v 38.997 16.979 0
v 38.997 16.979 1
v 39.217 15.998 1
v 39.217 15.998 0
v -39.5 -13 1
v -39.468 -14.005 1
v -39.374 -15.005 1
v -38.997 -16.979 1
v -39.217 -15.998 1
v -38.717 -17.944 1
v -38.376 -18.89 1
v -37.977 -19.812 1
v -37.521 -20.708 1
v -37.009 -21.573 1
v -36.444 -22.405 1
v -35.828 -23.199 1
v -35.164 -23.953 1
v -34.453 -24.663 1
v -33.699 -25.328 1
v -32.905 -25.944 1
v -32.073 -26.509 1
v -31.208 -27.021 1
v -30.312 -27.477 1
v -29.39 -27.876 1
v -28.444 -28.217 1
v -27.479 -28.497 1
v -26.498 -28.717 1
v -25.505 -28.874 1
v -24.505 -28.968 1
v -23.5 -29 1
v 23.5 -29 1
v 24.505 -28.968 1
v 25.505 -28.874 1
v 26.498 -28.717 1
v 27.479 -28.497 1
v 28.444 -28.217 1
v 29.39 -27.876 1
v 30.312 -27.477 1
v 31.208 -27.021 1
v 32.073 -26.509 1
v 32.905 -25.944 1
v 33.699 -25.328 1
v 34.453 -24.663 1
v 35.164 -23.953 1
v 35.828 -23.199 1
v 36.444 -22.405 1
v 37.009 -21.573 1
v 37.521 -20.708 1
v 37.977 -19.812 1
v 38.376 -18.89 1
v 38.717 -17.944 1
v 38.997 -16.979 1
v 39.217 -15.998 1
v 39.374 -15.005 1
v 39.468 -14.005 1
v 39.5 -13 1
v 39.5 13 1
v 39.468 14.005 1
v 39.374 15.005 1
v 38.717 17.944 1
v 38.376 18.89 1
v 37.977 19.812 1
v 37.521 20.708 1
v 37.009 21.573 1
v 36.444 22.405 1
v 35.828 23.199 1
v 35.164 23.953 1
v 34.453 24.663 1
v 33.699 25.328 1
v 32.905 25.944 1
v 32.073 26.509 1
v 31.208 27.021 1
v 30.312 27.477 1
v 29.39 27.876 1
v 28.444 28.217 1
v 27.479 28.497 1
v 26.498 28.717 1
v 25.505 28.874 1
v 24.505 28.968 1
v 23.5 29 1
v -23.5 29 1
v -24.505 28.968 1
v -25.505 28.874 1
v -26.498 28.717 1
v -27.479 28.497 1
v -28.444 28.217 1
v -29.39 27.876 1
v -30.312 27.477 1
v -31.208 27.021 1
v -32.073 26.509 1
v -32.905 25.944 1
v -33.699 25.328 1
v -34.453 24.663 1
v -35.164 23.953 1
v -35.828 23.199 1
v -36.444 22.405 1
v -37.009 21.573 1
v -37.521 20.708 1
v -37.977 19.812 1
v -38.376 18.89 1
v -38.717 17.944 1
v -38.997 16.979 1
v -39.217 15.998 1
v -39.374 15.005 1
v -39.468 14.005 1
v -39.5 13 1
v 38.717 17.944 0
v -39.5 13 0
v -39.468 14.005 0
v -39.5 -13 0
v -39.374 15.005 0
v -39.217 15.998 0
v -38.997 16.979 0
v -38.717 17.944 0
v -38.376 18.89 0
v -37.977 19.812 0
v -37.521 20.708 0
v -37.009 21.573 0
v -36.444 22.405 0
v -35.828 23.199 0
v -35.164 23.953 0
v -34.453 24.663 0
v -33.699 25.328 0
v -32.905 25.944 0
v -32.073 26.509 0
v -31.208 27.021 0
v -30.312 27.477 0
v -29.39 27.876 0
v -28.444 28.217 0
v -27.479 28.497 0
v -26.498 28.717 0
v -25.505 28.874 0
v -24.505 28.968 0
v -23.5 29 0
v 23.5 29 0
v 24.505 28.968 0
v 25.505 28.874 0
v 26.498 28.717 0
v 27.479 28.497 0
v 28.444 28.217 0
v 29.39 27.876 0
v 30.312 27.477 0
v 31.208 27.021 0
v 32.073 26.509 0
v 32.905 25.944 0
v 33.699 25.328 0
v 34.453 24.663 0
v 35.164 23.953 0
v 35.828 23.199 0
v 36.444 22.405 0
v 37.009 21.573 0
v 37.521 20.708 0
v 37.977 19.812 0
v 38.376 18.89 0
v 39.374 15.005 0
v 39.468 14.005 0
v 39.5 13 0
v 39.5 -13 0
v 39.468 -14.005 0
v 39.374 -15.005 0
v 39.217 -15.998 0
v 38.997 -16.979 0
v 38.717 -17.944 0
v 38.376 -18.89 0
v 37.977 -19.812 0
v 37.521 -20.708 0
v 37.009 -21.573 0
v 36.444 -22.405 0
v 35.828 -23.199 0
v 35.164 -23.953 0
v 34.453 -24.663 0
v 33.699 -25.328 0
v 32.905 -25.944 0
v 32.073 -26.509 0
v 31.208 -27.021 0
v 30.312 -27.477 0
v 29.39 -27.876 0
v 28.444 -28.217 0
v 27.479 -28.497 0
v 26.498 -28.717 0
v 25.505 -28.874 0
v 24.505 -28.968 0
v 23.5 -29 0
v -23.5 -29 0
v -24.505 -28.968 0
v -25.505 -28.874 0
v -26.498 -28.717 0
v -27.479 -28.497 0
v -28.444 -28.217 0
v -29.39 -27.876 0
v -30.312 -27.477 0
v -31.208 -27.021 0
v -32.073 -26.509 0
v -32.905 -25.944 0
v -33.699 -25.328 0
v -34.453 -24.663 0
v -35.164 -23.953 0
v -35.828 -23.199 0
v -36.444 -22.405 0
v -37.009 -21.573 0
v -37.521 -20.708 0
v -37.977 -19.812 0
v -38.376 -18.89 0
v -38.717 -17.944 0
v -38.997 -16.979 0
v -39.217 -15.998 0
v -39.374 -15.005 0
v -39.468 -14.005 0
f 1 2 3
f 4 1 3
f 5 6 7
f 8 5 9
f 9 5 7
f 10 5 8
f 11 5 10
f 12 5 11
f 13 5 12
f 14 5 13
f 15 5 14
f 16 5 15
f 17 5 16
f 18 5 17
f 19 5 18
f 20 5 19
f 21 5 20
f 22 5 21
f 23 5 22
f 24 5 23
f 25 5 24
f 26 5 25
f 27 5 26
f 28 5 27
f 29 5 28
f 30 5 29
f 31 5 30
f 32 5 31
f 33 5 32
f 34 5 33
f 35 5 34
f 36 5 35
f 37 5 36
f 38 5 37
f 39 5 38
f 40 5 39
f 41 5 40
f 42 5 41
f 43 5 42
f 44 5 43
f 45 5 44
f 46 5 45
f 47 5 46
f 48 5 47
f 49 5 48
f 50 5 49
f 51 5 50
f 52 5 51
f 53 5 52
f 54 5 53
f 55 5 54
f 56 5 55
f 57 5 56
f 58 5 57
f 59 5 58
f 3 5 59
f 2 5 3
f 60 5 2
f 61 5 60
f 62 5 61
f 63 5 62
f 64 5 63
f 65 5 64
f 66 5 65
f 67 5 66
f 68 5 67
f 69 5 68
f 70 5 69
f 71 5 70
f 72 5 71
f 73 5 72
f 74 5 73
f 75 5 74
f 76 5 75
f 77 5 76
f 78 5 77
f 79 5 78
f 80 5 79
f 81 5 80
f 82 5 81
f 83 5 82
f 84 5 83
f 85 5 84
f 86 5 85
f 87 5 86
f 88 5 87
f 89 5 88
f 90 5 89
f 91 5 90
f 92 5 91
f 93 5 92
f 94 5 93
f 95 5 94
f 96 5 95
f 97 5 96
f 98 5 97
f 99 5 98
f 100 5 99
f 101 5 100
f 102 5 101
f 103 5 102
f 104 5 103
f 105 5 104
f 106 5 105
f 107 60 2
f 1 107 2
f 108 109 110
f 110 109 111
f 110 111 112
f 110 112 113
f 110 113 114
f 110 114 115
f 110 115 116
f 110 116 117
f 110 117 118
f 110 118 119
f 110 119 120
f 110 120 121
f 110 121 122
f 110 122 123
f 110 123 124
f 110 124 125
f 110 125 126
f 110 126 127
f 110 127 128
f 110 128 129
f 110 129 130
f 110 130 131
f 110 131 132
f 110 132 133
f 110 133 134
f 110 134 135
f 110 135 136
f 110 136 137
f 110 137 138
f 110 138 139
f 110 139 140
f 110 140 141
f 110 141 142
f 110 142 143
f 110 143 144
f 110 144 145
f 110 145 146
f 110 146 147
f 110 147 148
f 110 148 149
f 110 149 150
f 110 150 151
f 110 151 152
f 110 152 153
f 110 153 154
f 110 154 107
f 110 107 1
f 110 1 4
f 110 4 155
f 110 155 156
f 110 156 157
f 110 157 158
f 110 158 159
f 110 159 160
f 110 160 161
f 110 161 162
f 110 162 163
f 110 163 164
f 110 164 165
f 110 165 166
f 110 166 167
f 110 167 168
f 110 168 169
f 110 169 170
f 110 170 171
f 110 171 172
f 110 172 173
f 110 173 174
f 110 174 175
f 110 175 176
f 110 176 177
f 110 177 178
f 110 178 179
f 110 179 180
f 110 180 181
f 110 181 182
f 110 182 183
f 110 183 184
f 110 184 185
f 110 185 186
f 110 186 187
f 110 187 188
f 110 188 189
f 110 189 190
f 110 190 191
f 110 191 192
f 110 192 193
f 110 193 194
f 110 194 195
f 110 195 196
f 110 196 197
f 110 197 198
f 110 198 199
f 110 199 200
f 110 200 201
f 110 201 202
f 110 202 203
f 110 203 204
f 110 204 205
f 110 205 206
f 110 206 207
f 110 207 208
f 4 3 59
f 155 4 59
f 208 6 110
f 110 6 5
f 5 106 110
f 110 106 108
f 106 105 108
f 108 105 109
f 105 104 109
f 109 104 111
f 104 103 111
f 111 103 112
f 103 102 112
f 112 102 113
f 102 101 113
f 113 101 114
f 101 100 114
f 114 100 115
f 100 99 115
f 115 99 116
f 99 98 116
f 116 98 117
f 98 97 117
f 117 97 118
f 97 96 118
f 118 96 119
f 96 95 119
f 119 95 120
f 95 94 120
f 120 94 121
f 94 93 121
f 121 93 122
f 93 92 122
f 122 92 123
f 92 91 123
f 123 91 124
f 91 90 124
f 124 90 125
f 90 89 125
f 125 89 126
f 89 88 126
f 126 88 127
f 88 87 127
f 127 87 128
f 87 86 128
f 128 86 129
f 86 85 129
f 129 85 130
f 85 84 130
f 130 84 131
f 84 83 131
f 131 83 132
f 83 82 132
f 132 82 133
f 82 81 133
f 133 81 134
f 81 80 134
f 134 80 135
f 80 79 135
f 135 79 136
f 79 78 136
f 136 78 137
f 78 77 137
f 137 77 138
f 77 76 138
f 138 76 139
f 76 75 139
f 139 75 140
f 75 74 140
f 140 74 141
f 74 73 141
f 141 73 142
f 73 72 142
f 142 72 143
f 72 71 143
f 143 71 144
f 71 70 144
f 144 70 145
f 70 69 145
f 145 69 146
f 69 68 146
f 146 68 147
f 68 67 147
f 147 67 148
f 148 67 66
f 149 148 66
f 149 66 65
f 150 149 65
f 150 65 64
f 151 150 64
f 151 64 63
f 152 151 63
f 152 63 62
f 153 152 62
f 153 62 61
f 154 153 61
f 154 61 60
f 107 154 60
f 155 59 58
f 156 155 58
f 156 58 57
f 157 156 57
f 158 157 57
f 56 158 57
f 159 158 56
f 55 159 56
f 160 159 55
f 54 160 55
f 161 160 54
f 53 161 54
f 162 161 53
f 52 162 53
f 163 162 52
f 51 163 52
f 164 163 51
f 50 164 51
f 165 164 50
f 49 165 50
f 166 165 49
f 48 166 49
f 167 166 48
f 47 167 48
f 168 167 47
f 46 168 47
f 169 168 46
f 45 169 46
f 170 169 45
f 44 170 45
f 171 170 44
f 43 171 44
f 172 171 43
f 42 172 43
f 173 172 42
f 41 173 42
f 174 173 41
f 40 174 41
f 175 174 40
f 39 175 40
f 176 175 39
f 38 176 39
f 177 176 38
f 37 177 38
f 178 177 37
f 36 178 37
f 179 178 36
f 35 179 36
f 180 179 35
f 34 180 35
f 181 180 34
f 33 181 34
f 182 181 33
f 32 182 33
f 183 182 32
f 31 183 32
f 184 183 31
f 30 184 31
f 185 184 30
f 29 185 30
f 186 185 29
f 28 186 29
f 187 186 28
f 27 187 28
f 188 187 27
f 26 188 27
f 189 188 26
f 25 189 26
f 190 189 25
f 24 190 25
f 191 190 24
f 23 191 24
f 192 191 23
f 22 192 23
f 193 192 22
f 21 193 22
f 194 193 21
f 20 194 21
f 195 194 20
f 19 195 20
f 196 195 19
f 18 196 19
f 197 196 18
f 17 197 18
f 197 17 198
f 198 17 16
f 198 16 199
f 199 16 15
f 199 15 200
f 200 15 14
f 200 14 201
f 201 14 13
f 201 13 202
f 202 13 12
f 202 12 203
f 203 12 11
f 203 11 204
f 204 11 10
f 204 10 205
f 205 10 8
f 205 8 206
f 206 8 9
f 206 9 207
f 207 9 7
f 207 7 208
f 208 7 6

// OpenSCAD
points_0=[[38.9973,16.979,0],[38.9973,16.979,1],[39.2166,15.9981,1],[39.2166,15.9981,0],[-39.5,-13,1],[-39.4684,-14.0046,1],[-39.3738,-15.0053,1],[-38.9973,-16.979,1],[-39.2166,-15.9981,1],[-38.7169,-17.9443,1],[-38.3764,-18.89,1],[-37.9772,-19.8125,1],[-37.5209,-20.7081,1],[-37.0092,-21.5732,1],[-36.4443,-22.4046,1],[-35.8282,-23.1988,1],[-35.1635,-23.9527,1],[-34.4527,-24.6635,1],[-33.6988,-25.3282,1],[-32.9046,-25.9443,1],[-32.0732,-26.5092,1],[-31.2081,-27.0209,1],[-30.3125,-27.4772,1],[-29.39,-27.8764,1],[-28.4443,-28.2169,1],[-27.479,-28.4973,1],[-26.4981,-28.7166,1],[-25.5053,-28.8738,1],[-24.5046,-28.9684,1],[-23.5,-29,1],[23.5,-29,1],[24.5046,-28.9684,1],[25.5053,-28.8738,1],[26.4981,-28.7166,1],[27.479,-28.4973,1],[28.4443,-28.2169,1],[29.39,-27.8764,1],[30.3125,-27.4772,1],[31.2081,-27.0209,1],[32.0732,-26.5092,1],[32.9046,-25.9443,1],[33.6988,-25.3282,1],[34.4527,-24.6635,1],[35.1635,-23.9527,1],[35.8282,-23.1988,1],[36.4443,-22.4046,1],[37.0092,-21.5732,1],[37.5209,-20.7081,1],[37.9772,-19.8125,1],[38.3764,-18.89,1],[38.7169,-17.9443,1],[38.9973,-16.979,1],[39.2166,-15.9981,1],[39.3738,-15.0053,1],[39.4684,-14.0046,1],[39.5,-13,1],[39.5,13,1],[39.4684,14.0046,1],[39.3738,15.0053,1],[38.7169,17.9443,1],[38.3764,18.89,1],[37.9772,19.8125,1],[37.5209,20.7081,1],[37.0092,21.5732,1],[36.4443,22.4046,1],[35.8282,23.1988,1],[35.1635,23.9527,1],[34.4527,24.6635,1],[33.6988,25.3282,1],[32.9046,25.9443,1],[32.0732,26.5092,1],[31.2081,27.0209,1],[30.3125,27.4772,1],[29.39,27.8764,1],[28.4443,28.2169,1],[27.479,28.4973,1],[26.4981,28.7166,1],[25.5053,28.8738,1],[24.5046,28.9684,1],[23.5,29,1],[-23.5,29,1],[-24.5046,28.9684,1],[-25.5053,28.8738,1],[-26.4981,28.7166,1],[-27.479,28.4973,1],[-28.4443,28.2169,1],[-29.39,27.8764,1],[-30.3125,27.4772,1],[-31.2081,27.0209,1],[-32.0732,26.5092,1],[-32.9046,25.9443,1],[-33.6988,25.3282,1],[-34.4527,24.6635,1],[-35.1635,23.9527,1],[-35.8282,23.1988,1],[-36.4443,22.4046,1],[-37.0092,21.5732,1],[-37.5209,20.7081,1],[-37.9772,19.8125,1],[-38.3764,18.89,1],[-38.7169,17.9443,1],[-38.9973,16.979,1],[-39.2166,15.9981,1],[-39.3738,15.0053,1],[-39.4684,14.0046,1],[-39.5,13,1],[38.7169,17.9443,0],[-39.5,13,0],[-39.4684,14.0046,0],[-39.5,-13,0],[-39.3738,15.0053,0],[-39.2166,15.9981,0],[-38.9973,16.979,0],[-38.7169,17.9443,0],[-38.3764,18.89,0],[-37.9772,19.8125,0],[-37.5209,20.7081,0],[-37.0092,21.5732,0],[-36.4443,22.4046,0],[-35.8282,23.1988,0],[-35.1635,23.9527,0],[-34.4527,24.6635,0],[-33.6988,25.3282,0],[-32.9046,25.9443,0],[-32.0732,26.5092,0],[-31.2081,27.0209,0],[-30.3125,27.4772,0],[-29.39,27.8764,0],[-28.4443,28.2169,0],[-27.479,28.4973,0],[-26.4981,28.7166,0],[-25.5053,28.8738,0],[-24.5046,28.9684,0],[-23.5,29,0],[23.5,29,0],[24.5046,28.9684,0],[25.5053,28.8738,0],[26.4981,28.7166,0],[27.479,28.4973,0],[28.4443,28.2169,0],[29.39,27.8764,0],[30.3125,27.4772,0],[31.2081,27.0209,0],[32.0732,26.5092,0],[32.9046,25.9443,0],[33.6988,25.3282,0],[34.4527,24.6635,0],[35.1635,23.9527,0],[35.8282,23.1988,0],[36.4443,22.4046,0],[37.0092,21.5732,0],[37.5209,20.7081,0],[37.9772,19.8125,0],[38.3764,18.89,0],[39.3738,15.0053,0],[39.4684,14.0046,0],[39.5,13,0],[39.5,-13,0],[39.4684,-14.0046,0],[39.3738,-15.0053,0],[39.2166,-15.9981,0],[38.9973,-16.979,0],[38.7169,-17.9443,0],[38.3764,-18.89,0],[37.9772,-19.8125,0],[37.5209,-20.7081,0],[37.0092,-21.5732,0],[36.4443,-22.4046,0],[35.8282,-23.1988,0],[35.1635,-23.9527,0],[34.4527,-24.6635,0],[33.6988,-25.3282,0],[32.9046,-25.9443,0],[32.0732,-26.5092,0],[31.2081,-27.0209,0],[30.3125,-27.4772,0],[29.39,-27.8764,0],[28.4443,-28.2169,0],[27.479,-28.4973,0],[26.4981,-28.7166,0],[25.5053,-28.8738,0],[24.5046,-28.9684,0],[23.5,-29,0],[-23.5,-29,0],[-24.5046,-28.9684,0],[-25.5053,-28.8738,0],[-26.4981,-28.7166,0],[-27.479,-28.4973,0],[-28.4443,-28.2169,0],[-29.39,-27.8764,0],[-30.3125,-27.4772,0],[-31.2081,-27.0209,0],[-32.0732,-26.5092,0],[-32.9046,-25.9443,0],[-33.6988,-25.3282,0],[-34.4527,-24.6635,0],[-35.1635,-23.9527,0],[-35.8282,-23.1988,0],[-36.4443,-22.4046,0],[-37.0092,-21.5732,0],[-37.5209,-20.7081,0],[-37.9772,-19.8125,0],[-38.3764,-18.89,0],[-38.7169,-17.9443,0],[-38.9973,-16.979,0],[-39.2166,-15.9981,0],[-39.3738,-15.0053,0],[-39.4684,-14.0046,0]];
triangles_0=[[2,1,0],[2,0,3],[6,5,4],[8,4,7],[6,4,8],[7,4,9],[9,4,10],[10,4,11],[11,4,12],[12,4,13],[13,4,14],[14,4,15],[15,4,16],[16,4,17],[17,4,18],[18,4,19],[19,4,20],[20,4,21],[21,4,22],[22,4,23],[23,4,24],[24,4,25],[25,4,26],[26,4,27],[27,4,28],[28,4,29],[29,4,30],[30,4,31],[31,4,32],[32,4,33],[33,4,34],[34,4,35],[35,4,36],[36,4,37],[37,4,38],[38,4,39],[39,4,40],[40,4,41],[41,4,42],[42,4,43],[43,4,44],[44,4,45],[45,4,46],[46,4,47],[47,4,48],[48,4,49],[49,4,50],[50,4,51],[51,4,52],[52,4,53],[53,4,54],[54,4,55],[55,4,56],[56,4,57],[57,4,58],[58,4,2],[2,4,1],[1,4,59],[59,4,60],[60,4,61],[61,4,62],[62,4,63],[63,4,64],[64,4,65],[65,4,66],[66,4,67],[67,4,68],[68,4,69],[69,4,70],[70,4,71],[71,4,72],[72,4,73],[73,4,74],[74,4,75],[75,4,76],[76,4,77],[77,4,78],[78,4,79],[79,4,80],[80,4,81],[81,4,82],[82,4,83],[83,4,84],[84,4,85],[85,4,86],[86,4,87],[87,4,88],[88,4,89],[89,4,90],[90,4,91],[91,4,92],[92,4,93],[93,4,94],[94,4,95],[95,4,96],[96,4,97],[97,4,98],[98,4,99],[99,4,100],[100,4,101],[101,4,102],[102,4,103],[103,4,104],[104,4,105],[1,59,106],[1,106,0],[109,108,107],[110,108,109],[111,110,109],[112,111,109],[113,112,109],[114,113,109],[115,114,109],[116,115,109],[117,116,109],[118,117,109],[119,118,109],[120,119,109],[121,120,109],[122,121,109],[123,122,109],[124,123,109],[125,124,109],[126,125,109],[127,126,109],[128,127,109],[129,128,109],[130,129,109],[131,130,109],[132,131,109],[133,132,109],[134,133,109],[135,134,109],[136,135,109],[137,136,109],[138,137,109],[139,138,109],[140,139,109],[141,140,109],[142,141,109],[143,142,109],[144,143,109],[145,144,109],[146,145,109],[147,146,109],[148,147,109],[149,148,109],[150,149,109],[151,150,109],[152,151,109],[153,152,109],[106,153,109],[0,106,109],[3,0,109],[154,3,109],[155,154,109],[156,155,109],[157,156,109],[158,157,109],[159,158,109],[160,159,109],[161,160,109],[162,161,109],[163,162,109],[164,163,109],[165,164,109],[166,165,109],[167,166,109],[168,167,109],[169,168,109],[170,169,109],[171,170,109],[172,171,109],[173,172,109],[174,173,109],[175,174,109],[176,175,109],[177,176,109],[178,177,109],[179,178,109],[180,179,109],[181,180,109],[182,181,109],[183,182,109],[184,183,109],[185,184,109],[186,185,109],[187,186,109],[188,187,109],[189,188,109],[190,189,109],[191,190,109],[192,191,109],[193,192,109],[194,193,109],[195,194,109],[196,195,109],[197,196,109],[198,197,109],[199,198,109],[200,199,109],[201,200,109],[202,201,109],[203,202,109],[204,203,109],[205,204,109],[206,205,109],[207,206,109],[58,2,3],[58,3,154],[109,5,207],[4,5,109],[109,105,4],[107,105,109],[107,104,105],[108,104,107],[108,103,104],[110,103,108],[110,102,103],[111,102,110],[111,101,102],[112,101,111],[112,100,101],[113,100,112],[113,99,100],[114,99,113],[114,98,99],[115,98,114],[115,97,98],[116,97,115],[116,96,97],[117,96,116],[117,95,96],[118,95,117],[118,94,95],[119,94,118],[119,93,94],[120,93,119],[120,92,93],[121,92,120],[121,91,92],[122,91,121],[122,90,91],[123,90,122],[123,89,90],[124,89,123],[124,88,89],[125,88,124],[125,87,88],[126,87,125],[126,86,87],[127,86,126],[127,85,86],[128,85,127],[128,84,85],[129,84,128],[129,83,84],[130,83,129],[130,82,83],[131,82,130],[131,81,82],[132,81,131],[132,80,81],[133,80,132],[133,79,80],[134,79,133],[134,78,79],[135,78,134],[135,77,78],[136,77,135],[136,76,77],[137,76,136],[137,75,76],[138,75,137],[138,74,75],[139,74,138],[139,73,74],[140,73,139],[140,72,73],[141,72,140],[141,71,72],[142,71,141],[142,70,71],[143,70,142],[143,69,70],[144,69,143],[144,68,69],[145,68,144],[145,67,68],[146,67,145],[146,66,67],[147,66,146],[65,66,147],[65,147,148],[64,65,148],[64,148,149],[63,64,149],[63,149,150],[62,63,150],[62,150,151],[61,62,151],[61,151,152],[60,61,152],[60,152,153],[59,60,153],[59,153,106],[57,58,154],[57,154,155],[56,57,155],[56,155,156],[56,156,157],[56,157,55],[55,157,158],[55,158,54],[54,158,159],[54,159,53],[53,159,160],[53,160,52],[52,160,161],[52,161,51],[51,161,162],[51,162,50],[50,162,163],[50,163,49],[49,163,164],[49,164,48],[48,164,165],[48,165,47],[47,165,166],[47,166,46],[46,166,167],[46,167,45],[45,167,168],[45,168,44],[44,168,169],[44,169,43],[43,169,170],[43,170,42],[42,170,171],[42,171,41],[41,171,172],[41,172,40],[40,172,173],[40,173,39],[39,173,174],[39,174,38],[38,174,175],[38,175,37],[37,175,176],[37,176,36],[36,176,177],[36,177,35],[35,177,178],[35,178,34],[34,178,179],[34,179,33],[33,179,180],[33,180,32],[32,180,181],[32,181,31],[31,181,182],[31,182,30],[30,182,183],[30,183,29],[29,183,184],[29,184,28],[28,184,185],[28,185,27],[27,185,186],[27,186,26],[26,186,187],[26,187,25],[25,187,188],[25,188,24],[24,188,189],[24,189,23],[23,189,190],[23,190,22],[22,190,191],[22,191,21],[21,191,192],[21,192,20],[20,192,193],[20,193,19],[19,193,194],[19,194,18],[18,194,195],[18,195,17],[17,195,196],[17,196,16],[197,16,196],[15,16,197],[198,15,197],[14,15,198],[199,14,198],[13,14,199],[200,13,199],[12,13,200],[201,12,200],[11,12,201],[202,11,201],[10,11,202],[203,10,202],[9,10,203],[204,9,203],[7,9,204],[205,7,204],[8,7,205],[206,8,205],[6,8,206],[207,6,206],[5,6,207]];
polyhedron(points_0,triangles_0);
